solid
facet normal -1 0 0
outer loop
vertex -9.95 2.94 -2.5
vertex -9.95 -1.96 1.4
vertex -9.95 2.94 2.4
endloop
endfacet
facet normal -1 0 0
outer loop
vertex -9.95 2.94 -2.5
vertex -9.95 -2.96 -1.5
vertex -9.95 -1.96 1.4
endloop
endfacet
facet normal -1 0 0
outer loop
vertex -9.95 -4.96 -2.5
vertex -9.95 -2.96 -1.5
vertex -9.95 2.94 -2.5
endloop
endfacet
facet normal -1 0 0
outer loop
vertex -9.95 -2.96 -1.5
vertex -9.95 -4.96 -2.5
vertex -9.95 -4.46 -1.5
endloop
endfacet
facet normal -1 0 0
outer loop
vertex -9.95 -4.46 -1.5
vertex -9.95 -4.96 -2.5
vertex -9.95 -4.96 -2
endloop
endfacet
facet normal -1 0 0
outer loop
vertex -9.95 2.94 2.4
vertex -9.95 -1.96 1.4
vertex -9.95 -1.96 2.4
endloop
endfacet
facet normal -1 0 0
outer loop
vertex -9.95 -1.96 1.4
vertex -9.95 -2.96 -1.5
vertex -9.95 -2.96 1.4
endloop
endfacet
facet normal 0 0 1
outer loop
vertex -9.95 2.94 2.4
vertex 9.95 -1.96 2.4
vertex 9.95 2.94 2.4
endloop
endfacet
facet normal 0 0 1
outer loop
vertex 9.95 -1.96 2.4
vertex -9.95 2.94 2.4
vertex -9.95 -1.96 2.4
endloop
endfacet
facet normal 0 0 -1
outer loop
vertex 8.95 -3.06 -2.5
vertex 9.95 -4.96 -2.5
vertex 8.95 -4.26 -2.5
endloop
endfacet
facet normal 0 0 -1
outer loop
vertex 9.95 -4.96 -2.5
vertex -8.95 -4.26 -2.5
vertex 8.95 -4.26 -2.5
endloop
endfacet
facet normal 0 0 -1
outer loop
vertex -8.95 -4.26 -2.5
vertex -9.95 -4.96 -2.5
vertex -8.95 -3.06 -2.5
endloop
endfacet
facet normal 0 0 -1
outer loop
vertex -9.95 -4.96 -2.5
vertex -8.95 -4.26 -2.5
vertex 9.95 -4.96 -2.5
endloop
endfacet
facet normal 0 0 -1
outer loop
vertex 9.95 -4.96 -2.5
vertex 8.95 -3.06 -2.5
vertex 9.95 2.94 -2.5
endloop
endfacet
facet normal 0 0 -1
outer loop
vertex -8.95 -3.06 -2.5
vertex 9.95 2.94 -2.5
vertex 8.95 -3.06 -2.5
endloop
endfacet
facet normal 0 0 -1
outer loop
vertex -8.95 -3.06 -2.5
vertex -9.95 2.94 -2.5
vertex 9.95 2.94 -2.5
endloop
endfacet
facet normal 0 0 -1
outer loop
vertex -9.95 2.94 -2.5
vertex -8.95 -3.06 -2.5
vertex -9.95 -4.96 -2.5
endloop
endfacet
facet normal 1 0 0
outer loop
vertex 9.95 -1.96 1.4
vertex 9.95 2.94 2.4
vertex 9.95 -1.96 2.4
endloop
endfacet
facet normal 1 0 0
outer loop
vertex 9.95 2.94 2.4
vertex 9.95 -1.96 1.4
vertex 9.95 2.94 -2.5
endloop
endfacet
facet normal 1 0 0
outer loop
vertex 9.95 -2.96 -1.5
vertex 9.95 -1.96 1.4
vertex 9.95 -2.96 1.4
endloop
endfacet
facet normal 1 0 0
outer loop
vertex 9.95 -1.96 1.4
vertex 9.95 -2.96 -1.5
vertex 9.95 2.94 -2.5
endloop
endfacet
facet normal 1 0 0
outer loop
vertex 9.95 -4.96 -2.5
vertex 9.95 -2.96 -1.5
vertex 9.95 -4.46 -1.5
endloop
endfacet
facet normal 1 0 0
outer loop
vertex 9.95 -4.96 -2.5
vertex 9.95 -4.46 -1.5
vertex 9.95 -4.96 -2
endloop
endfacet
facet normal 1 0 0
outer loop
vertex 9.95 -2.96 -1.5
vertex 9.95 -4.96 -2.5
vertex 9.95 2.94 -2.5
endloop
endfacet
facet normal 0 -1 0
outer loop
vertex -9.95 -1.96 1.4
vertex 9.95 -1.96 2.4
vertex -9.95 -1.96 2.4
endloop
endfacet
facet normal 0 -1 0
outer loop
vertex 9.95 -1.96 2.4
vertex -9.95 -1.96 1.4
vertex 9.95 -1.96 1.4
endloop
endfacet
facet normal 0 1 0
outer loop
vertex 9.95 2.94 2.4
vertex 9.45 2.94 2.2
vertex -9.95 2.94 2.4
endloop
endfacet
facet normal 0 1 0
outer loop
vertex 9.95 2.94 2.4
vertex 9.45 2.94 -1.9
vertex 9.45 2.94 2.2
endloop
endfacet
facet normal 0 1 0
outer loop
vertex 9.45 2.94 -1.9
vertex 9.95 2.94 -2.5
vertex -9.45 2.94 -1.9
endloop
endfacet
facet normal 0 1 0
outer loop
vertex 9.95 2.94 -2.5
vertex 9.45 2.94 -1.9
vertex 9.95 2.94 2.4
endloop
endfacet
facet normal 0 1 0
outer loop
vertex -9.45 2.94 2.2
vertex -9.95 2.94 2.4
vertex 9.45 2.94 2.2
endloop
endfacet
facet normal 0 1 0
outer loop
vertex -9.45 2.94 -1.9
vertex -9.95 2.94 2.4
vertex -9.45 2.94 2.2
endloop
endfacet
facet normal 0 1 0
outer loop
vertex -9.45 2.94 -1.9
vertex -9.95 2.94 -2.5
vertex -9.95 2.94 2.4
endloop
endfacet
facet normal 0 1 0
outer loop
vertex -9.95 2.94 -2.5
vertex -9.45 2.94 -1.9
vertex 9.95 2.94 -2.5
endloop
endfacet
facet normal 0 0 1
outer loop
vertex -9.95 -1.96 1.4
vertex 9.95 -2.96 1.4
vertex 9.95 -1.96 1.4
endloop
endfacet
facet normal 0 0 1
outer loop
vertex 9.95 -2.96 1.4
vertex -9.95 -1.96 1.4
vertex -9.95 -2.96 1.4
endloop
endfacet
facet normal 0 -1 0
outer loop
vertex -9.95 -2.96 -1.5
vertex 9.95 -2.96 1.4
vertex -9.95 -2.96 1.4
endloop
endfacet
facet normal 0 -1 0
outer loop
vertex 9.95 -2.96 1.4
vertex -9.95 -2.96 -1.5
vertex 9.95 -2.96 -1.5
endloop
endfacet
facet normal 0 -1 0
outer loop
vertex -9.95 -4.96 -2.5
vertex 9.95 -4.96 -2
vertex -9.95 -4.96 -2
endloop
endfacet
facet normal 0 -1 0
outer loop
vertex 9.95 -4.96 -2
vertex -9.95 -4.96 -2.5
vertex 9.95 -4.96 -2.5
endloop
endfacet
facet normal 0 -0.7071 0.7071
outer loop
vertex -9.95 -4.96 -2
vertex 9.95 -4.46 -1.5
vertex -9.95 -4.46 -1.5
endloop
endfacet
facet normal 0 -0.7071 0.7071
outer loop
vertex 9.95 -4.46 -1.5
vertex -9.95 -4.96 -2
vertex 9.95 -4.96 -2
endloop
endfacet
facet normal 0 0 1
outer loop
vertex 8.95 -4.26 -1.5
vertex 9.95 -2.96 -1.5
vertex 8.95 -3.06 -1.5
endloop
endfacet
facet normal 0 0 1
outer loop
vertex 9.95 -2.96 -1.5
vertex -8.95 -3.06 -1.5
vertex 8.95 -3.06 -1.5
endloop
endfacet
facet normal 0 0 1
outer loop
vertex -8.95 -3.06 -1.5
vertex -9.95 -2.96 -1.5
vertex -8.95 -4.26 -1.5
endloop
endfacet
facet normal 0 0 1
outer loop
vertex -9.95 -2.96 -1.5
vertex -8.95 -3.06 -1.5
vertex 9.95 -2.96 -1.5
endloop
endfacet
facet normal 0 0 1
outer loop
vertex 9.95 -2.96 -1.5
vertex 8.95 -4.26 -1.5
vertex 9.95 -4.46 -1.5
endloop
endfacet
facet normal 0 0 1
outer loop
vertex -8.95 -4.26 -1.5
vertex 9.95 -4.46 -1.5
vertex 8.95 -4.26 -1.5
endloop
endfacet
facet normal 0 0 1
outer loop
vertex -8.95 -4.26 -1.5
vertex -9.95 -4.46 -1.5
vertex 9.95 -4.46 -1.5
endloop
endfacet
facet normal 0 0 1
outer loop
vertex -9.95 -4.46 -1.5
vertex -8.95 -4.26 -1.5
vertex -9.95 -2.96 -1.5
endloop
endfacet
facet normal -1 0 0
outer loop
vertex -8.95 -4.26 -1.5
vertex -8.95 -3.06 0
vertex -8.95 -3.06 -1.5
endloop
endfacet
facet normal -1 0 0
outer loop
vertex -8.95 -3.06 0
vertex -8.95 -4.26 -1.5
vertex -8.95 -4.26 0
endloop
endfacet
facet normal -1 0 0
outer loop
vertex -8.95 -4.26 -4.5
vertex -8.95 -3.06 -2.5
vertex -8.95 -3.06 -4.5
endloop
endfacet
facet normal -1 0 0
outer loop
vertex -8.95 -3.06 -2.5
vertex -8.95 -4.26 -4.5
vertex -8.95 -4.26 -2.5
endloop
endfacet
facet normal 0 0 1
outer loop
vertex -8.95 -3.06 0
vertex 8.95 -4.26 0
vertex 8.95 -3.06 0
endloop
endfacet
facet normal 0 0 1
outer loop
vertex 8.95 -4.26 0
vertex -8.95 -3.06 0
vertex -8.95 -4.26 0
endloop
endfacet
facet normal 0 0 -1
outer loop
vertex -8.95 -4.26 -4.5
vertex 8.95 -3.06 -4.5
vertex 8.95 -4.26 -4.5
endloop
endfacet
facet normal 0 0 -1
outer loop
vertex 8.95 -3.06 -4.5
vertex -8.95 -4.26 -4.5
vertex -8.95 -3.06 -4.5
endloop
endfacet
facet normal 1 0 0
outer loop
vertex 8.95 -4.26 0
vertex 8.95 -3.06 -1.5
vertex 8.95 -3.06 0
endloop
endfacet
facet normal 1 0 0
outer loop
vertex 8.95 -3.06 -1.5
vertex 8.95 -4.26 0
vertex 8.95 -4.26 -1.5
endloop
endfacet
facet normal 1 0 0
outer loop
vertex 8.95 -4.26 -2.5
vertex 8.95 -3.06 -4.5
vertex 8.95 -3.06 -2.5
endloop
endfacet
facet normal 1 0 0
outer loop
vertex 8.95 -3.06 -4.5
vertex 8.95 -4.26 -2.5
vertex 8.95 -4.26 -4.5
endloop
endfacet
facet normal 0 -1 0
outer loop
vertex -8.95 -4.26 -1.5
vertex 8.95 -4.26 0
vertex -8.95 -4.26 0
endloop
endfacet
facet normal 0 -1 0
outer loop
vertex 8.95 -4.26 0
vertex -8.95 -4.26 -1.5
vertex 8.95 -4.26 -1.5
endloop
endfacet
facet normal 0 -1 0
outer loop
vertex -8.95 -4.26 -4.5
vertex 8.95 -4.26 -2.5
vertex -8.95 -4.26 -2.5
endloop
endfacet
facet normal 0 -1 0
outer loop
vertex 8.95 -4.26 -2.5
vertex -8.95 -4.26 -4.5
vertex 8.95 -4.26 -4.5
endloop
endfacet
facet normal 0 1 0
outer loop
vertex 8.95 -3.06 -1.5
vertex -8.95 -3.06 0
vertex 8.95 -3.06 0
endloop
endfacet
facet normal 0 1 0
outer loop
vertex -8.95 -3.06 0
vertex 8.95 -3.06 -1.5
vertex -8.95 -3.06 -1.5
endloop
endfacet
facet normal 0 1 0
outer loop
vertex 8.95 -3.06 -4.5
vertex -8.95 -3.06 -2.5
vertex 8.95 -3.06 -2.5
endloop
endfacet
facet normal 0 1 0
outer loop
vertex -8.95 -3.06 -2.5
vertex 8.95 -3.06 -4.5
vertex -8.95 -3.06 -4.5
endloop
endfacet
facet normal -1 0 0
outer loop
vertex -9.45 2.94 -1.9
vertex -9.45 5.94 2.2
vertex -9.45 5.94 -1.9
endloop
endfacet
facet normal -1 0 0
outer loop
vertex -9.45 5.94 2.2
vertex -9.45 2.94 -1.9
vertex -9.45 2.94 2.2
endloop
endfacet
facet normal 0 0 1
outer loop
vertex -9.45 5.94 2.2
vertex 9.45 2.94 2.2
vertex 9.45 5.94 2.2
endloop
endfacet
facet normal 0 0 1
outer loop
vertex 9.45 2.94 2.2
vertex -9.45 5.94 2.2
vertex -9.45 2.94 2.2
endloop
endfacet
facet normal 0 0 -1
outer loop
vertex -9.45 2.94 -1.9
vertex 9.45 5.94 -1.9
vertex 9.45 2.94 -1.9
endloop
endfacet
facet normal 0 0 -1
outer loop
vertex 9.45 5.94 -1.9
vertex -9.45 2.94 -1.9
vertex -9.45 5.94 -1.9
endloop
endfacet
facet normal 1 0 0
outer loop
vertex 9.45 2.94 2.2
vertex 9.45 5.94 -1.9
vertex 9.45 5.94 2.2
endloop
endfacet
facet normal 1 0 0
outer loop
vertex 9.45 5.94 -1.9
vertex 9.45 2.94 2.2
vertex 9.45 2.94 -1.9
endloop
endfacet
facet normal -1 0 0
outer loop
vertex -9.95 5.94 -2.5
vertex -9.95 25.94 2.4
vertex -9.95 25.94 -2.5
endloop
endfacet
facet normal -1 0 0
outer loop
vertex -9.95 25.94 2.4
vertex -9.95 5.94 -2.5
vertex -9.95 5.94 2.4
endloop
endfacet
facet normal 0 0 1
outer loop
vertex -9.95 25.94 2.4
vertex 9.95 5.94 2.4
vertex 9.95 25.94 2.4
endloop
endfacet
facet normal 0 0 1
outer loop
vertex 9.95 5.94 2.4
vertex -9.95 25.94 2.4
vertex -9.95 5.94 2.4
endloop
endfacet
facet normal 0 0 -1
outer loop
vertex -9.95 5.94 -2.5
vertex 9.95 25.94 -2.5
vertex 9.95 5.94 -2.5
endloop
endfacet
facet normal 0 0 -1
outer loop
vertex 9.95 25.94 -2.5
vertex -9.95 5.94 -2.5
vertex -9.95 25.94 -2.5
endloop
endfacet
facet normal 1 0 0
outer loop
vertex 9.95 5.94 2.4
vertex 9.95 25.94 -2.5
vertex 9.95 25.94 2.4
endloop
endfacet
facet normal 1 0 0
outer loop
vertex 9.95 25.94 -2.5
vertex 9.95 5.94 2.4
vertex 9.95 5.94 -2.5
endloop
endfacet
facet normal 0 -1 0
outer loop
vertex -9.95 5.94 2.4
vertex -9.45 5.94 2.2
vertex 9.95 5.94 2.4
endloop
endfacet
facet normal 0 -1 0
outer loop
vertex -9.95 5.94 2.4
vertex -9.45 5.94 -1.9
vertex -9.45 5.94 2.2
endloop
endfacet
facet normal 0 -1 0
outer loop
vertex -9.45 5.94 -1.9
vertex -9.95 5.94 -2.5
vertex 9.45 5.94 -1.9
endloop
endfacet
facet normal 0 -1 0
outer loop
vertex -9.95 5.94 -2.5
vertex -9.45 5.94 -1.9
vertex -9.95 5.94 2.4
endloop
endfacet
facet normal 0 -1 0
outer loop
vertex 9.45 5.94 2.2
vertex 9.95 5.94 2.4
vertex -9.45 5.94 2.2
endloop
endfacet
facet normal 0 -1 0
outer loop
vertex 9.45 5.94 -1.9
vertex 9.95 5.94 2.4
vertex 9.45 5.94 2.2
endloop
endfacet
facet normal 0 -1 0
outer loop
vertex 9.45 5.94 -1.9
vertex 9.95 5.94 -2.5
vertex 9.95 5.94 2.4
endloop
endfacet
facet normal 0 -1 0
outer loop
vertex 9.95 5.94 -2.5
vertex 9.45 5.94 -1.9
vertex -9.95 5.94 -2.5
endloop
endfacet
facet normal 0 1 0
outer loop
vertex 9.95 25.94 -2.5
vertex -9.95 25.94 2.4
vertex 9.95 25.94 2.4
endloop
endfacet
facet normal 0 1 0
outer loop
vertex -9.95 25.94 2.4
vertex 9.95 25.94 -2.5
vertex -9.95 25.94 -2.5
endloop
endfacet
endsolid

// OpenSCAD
N=7;
A=2.4+N*2.5;
rotate([0,0,180])
translate([-A/2,-2.94,-2.5])
{
	cube([A,4.9,4.9]);
	cube([A,5.9,3.9]);
	hull()
	{
		cube([A,7.4,1]);
		cube([A,7.9,0.5]);
	}
	translate([1,6,-2])cube([A-2,1.2,4.5]); // Assumes cropped pins
	// Plug
	translate([0.5,-20,0.6])cube([A-1,21,4.1]);
	translate([0,-23,0])cube([A,20,4.9]);
}
